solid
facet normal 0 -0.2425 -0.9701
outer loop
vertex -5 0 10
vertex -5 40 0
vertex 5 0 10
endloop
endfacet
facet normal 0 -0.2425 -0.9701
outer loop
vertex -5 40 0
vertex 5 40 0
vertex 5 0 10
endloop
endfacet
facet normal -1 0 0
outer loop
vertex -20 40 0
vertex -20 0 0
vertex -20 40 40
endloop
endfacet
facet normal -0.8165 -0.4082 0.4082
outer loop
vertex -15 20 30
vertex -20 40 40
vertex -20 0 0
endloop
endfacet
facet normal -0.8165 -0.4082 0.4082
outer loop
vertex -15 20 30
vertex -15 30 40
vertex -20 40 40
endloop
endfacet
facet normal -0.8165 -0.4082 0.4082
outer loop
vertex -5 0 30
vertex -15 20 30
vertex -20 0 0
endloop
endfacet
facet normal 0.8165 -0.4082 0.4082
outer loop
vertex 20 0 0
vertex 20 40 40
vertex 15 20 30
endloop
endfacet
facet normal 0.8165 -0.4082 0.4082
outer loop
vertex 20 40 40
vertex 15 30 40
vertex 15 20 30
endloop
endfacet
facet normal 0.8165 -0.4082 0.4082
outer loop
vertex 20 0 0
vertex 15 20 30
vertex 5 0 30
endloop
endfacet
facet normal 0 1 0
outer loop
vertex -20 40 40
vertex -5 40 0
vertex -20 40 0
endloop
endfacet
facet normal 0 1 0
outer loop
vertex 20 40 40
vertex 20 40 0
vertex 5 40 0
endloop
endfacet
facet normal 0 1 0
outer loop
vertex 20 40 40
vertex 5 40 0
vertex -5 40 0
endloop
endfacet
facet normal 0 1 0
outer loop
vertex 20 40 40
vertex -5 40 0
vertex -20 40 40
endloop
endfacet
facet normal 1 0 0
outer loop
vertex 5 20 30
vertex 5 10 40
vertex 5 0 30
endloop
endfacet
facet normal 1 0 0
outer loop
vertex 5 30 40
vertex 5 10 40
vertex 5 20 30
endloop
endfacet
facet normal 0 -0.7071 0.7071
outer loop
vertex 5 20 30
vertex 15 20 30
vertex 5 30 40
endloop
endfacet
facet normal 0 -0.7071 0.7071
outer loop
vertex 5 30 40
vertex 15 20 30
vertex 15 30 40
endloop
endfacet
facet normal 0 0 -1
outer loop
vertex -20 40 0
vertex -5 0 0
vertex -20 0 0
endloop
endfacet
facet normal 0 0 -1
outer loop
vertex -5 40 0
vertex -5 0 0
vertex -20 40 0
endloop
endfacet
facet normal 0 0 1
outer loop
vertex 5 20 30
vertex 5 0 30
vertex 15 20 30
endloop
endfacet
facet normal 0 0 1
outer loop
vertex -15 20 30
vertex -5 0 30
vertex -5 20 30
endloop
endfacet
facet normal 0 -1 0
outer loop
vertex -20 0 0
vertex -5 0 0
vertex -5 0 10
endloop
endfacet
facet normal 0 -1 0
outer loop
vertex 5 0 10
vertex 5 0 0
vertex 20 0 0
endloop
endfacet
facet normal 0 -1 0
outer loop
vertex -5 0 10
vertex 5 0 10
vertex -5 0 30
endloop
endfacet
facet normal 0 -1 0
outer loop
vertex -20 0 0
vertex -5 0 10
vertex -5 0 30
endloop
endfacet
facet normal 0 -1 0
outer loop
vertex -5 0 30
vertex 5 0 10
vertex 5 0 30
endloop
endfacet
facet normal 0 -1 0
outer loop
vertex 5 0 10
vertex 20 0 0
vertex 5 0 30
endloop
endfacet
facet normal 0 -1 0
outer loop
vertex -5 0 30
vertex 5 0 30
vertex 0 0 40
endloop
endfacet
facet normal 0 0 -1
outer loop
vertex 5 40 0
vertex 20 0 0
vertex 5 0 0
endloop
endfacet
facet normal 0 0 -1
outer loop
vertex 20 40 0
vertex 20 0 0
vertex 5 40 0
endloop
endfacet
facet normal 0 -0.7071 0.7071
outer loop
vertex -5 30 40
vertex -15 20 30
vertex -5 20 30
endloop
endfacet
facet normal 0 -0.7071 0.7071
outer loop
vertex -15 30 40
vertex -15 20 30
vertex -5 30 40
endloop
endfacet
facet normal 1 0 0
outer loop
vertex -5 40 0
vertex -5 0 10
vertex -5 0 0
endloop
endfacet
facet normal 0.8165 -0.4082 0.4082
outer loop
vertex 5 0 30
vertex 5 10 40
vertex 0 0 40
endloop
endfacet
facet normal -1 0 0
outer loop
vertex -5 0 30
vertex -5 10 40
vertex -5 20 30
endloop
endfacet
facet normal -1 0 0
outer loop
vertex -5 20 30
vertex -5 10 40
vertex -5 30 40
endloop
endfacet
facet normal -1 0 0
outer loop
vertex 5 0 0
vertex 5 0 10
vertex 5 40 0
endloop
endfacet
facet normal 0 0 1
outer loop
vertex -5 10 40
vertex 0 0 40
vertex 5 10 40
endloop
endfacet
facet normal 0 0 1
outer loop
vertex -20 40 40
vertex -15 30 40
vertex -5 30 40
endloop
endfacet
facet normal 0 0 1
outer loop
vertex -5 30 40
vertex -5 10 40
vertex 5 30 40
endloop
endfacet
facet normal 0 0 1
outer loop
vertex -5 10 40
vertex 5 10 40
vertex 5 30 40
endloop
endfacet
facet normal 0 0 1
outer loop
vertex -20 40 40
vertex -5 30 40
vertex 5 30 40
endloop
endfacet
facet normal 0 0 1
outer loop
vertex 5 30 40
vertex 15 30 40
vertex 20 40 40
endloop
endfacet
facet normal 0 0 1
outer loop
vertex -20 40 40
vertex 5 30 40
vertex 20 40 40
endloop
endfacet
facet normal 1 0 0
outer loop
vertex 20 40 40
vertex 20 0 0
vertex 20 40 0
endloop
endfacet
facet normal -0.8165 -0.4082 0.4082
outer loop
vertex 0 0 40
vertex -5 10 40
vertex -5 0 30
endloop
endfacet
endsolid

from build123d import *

# Parameters (mm, degrees)
F0_W     = 40
F0_H     = 40
F1_DEPTH = 20
F5_DEPTH = 16.3309316186
F7_DEPTH = 5
F9_DEPTH = 15


# Not quite as in the source:
# - a pattern or mirror of a feature is missing from the dataset's text; its kind, count and spacing are read off the source's solid


with BuildPart() as f1:
    # F0 (on Right) → F1 (new body, symmetric)
    with BuildSketch(Plane.YZ):
        with Locations((20, 20)):
            Rectangle(F0_W, F0_H)
    extrude(amount=F1_DEPTH, both=True)

    # F4 (on 3pt) → F5 (cut, through all)
    with BuildSketch(Plane(origin=(13.3333333333, -6.6666666667, 6.6666666667), x_dir=(-0.3651483717, -0.9128709292, -0.1825741858), z_dir=(-0.8164965809, 0.4082482905, -0.4082482905))):
        Polygon((-7.3029674334, -8.94427191), (-7.3029674334, 35.77708764), (-51.1207720338, 26.83281573), align=None)
    f5 = extrude(amount=-F5_DEPTH, mode=Mode.SUBTRACT)

    # F5_copies: F5 across plane
    add(f5.mirror(Plane(origin=(0, 0, 0), x_dir=(0, 0, -1), z_dir=(-1, 0, 0))), mode=Mode.SUBTRACT)

    # F6 (on Right) → F7 (cut, symmetric)
    with BuildSketch(Plane.YZ):
        Polygon((0, 10), (0, 0), (40, 0), align=None)
    extrude(amount=F7_DEPTH, both=True, mode=Mode.SUBTRACT)

    # F8 (on face) → F9 (cut)
    with BuildSketch(Plane.YZ.offset(20)):
        Polygon((30, 40), (10, 40), (0, 30), (20, 30), align=None)
    f9 = extrude(amount=-F9_DEPTH, mode=Mode.SUBTRACT)

    # F9_copies: F9 across plane
    add(f9.mirror(Plane(origin=(0, 0, 0), x_dir=(0, 0, -1), z_dir=(-1, 0, 0))), mode=Mode.SUBTRACT)


solid = f1.part
